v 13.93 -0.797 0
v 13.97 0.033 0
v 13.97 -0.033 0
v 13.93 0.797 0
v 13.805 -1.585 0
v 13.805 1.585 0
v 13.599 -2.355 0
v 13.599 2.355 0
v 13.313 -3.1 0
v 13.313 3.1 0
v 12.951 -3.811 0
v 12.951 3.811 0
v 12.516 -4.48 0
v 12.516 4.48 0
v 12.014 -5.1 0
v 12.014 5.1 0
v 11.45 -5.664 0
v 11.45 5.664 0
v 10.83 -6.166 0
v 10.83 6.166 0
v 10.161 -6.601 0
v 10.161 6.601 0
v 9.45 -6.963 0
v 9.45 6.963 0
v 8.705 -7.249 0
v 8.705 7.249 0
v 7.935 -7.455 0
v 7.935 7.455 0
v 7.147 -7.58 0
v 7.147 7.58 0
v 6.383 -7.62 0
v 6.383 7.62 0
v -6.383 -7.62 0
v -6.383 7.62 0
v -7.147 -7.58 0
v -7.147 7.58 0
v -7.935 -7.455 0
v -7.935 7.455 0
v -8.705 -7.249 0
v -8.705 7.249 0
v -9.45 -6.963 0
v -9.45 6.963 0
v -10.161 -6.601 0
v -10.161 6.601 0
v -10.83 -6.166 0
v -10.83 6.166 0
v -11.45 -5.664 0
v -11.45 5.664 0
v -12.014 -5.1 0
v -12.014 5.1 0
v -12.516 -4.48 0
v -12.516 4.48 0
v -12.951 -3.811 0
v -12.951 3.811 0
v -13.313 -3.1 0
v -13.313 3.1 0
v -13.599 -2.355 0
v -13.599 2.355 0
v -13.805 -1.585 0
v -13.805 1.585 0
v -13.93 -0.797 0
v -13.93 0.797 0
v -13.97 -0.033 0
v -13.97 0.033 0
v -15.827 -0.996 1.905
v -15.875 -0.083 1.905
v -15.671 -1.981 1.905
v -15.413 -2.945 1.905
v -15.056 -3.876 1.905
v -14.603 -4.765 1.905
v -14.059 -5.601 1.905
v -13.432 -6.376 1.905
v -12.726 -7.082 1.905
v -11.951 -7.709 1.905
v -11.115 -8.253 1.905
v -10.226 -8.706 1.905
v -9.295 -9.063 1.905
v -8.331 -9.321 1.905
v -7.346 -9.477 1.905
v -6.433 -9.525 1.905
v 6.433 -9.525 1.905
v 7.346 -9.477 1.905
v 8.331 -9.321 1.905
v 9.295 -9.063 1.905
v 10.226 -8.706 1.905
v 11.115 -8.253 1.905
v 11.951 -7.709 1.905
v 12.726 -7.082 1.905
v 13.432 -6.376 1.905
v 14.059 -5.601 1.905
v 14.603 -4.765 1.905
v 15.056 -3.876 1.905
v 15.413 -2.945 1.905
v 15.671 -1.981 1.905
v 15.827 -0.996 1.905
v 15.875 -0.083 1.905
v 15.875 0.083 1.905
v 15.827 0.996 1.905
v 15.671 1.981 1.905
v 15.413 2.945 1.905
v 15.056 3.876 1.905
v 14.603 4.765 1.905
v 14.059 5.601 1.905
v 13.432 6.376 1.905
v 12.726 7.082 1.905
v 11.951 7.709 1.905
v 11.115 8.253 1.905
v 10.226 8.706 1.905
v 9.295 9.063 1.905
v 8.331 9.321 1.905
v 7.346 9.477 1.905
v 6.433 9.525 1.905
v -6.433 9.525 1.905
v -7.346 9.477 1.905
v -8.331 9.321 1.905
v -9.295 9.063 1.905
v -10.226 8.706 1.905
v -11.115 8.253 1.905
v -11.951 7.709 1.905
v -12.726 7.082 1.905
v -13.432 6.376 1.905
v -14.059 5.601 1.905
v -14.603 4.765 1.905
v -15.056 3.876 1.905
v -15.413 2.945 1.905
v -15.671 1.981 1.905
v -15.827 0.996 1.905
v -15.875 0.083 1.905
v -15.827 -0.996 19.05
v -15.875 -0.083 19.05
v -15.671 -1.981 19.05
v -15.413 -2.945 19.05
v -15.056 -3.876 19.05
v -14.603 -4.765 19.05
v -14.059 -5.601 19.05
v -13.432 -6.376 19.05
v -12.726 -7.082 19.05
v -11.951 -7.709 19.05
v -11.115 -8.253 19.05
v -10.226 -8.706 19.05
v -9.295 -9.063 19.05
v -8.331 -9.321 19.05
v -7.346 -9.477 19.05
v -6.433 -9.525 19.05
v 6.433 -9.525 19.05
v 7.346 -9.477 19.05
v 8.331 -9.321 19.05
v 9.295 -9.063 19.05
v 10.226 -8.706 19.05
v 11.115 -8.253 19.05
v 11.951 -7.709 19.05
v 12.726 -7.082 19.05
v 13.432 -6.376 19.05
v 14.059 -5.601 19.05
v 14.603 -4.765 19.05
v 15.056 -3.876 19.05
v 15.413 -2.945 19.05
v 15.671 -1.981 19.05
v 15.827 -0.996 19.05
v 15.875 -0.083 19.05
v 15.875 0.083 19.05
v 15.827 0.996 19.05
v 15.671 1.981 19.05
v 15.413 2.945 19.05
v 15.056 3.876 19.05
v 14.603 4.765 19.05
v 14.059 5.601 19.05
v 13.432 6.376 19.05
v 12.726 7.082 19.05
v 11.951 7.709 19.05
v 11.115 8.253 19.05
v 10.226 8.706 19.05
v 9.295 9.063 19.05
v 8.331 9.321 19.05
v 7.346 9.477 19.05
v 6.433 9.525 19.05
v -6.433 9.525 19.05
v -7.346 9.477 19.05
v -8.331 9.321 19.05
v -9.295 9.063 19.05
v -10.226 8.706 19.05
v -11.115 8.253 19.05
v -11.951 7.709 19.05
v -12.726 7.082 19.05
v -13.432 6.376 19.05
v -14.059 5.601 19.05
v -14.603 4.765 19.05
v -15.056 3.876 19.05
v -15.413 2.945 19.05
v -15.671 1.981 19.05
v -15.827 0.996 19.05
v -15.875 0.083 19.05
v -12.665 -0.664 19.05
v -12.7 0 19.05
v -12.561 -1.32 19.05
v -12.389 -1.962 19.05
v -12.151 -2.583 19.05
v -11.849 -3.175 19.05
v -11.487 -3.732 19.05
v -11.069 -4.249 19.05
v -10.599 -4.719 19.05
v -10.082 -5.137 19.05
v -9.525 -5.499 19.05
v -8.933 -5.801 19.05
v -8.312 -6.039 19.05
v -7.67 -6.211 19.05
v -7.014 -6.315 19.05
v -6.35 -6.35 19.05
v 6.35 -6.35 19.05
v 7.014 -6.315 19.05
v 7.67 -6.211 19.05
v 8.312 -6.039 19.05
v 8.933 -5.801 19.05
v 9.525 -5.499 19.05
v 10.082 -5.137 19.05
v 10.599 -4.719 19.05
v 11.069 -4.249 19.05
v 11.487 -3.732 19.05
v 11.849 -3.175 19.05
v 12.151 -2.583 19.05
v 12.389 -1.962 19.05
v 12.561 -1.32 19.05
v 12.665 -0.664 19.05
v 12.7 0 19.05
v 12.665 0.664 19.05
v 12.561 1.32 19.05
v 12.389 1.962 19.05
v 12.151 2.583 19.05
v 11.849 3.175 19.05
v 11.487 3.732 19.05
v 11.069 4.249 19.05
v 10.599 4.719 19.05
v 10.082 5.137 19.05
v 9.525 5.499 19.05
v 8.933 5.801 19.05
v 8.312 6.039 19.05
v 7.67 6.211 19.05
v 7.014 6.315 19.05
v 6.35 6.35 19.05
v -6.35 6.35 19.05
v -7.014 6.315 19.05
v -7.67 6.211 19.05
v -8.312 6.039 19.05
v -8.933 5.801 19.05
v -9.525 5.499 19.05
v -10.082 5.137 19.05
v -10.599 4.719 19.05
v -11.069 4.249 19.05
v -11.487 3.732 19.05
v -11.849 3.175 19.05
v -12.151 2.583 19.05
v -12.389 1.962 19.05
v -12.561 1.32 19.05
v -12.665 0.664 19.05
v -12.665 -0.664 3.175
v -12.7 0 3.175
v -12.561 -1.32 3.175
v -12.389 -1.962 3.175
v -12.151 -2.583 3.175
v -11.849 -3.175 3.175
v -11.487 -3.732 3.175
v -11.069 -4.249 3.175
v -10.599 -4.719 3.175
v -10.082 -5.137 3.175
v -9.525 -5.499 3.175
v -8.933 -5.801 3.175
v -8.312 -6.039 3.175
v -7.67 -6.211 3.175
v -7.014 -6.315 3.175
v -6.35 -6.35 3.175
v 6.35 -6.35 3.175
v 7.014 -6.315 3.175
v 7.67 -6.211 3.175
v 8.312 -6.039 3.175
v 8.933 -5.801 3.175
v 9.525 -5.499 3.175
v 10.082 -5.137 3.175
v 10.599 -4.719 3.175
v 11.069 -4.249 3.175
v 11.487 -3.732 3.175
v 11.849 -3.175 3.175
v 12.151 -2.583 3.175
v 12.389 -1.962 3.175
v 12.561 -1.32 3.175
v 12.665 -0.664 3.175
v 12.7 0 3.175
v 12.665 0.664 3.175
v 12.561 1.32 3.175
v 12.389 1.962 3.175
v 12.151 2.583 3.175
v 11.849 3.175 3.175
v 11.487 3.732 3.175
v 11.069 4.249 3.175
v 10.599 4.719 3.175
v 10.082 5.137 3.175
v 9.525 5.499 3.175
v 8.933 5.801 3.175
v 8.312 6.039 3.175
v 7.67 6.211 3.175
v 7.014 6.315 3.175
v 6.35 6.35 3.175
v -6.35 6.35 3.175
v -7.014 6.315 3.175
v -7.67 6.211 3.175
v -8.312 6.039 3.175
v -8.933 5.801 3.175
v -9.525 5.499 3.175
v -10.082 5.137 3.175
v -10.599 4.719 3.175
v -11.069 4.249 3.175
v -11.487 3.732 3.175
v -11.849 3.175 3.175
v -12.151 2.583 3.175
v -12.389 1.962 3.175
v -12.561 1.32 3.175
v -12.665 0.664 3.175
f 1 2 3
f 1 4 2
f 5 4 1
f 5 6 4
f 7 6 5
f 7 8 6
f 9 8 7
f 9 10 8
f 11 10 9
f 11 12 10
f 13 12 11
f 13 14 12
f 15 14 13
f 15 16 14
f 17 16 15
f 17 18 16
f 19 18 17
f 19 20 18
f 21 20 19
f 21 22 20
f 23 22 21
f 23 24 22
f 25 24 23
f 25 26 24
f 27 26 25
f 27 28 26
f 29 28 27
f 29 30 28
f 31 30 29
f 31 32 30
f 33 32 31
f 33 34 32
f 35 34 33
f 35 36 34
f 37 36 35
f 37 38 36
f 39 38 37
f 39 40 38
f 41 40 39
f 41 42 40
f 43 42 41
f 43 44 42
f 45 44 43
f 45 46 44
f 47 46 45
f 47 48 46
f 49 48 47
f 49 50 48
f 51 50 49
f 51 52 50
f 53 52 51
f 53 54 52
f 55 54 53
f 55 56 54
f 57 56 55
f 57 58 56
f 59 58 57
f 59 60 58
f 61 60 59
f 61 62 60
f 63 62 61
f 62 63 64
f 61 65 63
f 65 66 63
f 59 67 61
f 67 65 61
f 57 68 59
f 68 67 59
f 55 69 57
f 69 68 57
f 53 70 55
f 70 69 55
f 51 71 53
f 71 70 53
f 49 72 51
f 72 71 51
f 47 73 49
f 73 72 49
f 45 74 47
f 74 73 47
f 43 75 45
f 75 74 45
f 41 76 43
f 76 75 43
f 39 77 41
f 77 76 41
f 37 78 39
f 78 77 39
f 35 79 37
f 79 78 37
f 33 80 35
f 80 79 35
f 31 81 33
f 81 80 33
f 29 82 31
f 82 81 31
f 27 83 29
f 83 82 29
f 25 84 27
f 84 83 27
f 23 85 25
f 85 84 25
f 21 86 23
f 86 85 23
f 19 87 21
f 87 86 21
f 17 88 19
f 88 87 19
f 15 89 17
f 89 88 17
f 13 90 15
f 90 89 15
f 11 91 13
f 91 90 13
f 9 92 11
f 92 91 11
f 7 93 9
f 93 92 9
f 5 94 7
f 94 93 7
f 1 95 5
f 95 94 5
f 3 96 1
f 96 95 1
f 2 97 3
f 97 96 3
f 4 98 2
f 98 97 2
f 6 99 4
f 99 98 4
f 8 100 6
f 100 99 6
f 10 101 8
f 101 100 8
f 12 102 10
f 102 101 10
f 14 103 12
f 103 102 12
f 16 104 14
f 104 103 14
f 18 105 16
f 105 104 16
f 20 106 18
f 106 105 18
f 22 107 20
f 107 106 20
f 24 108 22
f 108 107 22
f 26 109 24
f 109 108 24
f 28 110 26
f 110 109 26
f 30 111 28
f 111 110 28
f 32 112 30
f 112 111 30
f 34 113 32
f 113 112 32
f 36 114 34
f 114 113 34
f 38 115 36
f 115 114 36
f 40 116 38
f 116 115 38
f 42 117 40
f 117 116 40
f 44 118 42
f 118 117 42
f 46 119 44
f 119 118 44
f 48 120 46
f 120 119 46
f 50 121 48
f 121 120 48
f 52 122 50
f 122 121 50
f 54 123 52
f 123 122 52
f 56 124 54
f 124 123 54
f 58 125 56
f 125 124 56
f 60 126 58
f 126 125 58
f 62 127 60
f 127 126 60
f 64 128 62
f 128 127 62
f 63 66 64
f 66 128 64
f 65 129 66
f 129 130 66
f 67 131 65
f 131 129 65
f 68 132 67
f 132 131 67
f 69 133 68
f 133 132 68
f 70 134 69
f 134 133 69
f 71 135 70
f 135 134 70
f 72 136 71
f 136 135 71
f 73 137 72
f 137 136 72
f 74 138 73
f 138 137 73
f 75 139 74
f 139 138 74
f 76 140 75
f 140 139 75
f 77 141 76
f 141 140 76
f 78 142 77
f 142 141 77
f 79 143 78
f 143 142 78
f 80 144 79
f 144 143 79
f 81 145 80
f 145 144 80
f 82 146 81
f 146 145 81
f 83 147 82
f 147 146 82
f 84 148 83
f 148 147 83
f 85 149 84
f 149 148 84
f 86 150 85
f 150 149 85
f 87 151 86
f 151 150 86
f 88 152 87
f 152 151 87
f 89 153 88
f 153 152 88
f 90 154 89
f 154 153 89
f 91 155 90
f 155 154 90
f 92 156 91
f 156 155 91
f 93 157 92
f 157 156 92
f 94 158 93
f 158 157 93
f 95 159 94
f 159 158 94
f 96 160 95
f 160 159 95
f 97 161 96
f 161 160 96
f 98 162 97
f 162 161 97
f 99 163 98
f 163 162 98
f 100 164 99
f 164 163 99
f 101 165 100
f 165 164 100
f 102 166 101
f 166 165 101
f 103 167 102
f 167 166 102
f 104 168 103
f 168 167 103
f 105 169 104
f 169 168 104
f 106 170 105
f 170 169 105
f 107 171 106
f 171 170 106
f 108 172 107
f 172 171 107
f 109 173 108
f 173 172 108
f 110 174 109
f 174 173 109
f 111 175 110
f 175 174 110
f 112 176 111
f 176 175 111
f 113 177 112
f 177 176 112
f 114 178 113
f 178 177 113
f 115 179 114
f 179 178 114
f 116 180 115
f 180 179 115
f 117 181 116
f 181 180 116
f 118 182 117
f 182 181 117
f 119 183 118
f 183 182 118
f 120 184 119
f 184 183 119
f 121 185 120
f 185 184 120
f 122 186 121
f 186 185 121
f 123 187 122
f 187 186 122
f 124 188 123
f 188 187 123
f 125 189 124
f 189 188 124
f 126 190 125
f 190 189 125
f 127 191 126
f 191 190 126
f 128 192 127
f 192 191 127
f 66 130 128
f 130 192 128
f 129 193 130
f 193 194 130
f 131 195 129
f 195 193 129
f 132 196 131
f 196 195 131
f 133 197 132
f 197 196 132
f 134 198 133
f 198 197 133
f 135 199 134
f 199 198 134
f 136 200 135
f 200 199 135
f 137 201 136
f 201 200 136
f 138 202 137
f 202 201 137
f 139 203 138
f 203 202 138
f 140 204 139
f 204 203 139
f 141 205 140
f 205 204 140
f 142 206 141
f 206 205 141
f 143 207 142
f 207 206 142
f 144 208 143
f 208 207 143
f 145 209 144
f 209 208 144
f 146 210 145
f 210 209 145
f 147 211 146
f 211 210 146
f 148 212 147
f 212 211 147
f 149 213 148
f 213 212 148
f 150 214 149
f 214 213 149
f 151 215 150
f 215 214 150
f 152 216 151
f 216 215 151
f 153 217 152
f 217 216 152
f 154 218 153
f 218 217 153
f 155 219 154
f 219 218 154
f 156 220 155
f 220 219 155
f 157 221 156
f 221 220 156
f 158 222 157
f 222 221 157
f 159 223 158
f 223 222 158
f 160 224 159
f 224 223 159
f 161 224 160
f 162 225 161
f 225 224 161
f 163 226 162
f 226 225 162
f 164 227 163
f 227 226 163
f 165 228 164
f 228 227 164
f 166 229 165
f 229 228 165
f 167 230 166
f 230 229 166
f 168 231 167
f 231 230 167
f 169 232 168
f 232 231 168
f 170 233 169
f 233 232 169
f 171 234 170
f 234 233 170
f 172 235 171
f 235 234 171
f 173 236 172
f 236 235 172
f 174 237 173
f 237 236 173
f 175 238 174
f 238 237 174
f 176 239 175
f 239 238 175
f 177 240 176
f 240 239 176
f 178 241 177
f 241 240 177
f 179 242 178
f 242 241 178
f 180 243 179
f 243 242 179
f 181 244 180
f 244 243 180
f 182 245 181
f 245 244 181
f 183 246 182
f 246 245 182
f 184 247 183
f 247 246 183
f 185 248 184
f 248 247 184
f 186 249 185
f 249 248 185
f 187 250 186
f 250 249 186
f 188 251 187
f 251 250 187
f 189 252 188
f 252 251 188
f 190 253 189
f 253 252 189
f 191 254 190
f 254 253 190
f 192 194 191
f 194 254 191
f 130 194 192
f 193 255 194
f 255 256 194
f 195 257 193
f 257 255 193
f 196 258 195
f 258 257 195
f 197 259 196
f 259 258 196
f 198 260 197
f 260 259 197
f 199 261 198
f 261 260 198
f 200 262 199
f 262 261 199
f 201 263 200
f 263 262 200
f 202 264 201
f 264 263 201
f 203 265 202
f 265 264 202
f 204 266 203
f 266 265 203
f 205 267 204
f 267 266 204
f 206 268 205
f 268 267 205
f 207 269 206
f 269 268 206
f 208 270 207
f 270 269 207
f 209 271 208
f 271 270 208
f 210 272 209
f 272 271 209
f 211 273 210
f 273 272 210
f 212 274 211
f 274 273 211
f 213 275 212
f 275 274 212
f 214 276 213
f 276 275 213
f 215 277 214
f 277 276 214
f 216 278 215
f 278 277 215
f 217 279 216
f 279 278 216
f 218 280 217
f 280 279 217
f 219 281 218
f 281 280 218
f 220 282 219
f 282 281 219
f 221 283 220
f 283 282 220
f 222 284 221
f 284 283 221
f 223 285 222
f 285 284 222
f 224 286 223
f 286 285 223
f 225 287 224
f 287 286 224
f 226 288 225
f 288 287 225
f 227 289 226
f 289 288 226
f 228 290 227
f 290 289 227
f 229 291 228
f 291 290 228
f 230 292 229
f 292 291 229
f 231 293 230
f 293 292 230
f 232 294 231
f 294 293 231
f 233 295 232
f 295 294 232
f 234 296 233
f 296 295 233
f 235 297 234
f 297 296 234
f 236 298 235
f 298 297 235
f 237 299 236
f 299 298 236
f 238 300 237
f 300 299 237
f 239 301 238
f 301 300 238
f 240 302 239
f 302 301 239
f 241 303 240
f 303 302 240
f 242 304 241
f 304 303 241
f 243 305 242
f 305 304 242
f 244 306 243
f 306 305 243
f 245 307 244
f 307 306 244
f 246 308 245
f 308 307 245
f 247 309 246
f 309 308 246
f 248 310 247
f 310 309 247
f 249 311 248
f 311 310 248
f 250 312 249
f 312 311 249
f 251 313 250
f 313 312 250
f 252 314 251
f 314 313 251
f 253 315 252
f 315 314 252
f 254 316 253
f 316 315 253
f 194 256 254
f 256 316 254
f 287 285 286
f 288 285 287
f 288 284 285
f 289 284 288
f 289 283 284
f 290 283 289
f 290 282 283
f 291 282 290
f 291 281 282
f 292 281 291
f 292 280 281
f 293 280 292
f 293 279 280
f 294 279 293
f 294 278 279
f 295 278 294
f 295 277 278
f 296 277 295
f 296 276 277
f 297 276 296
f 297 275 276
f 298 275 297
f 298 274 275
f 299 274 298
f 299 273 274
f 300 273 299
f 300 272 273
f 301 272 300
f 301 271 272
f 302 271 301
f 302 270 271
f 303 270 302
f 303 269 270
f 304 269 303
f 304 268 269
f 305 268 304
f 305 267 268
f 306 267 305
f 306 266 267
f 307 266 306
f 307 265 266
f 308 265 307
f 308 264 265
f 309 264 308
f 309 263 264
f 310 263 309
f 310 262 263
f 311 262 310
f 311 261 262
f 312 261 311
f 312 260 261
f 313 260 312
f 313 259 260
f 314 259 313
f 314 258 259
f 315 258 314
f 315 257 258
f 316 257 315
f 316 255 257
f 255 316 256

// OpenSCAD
// file: ../lib/TOGMod1Constructors.scad
// TOGMod1Constructors-v1.11
// 
// Functions to construct objects understood by TOGMod1
// 
// v1.1:
// - Add togmod1_make_rounded_rect
// v1.2:
// - togmod1_make_rounded_rect can make ovals
// v1.3:
// - togmod1_circle_points, to just get the points of a circle
// - if pos parameter to circle function has a third element,
//   returned vertexes will include it as the z component;
// v1.3.1
// - Some assertions
// v1.4:
// - Refactor togmod1_rounded_rect_points and togmod1_circle_points
//   to use togmod1__make_nd_vector_adder for adapting to whatever
//   `pos` parameter is.
// v1.5:
// - togmod_rounded_rect_points will not simplify completely rounded sides
//   (where length of side is exactly twice the rounding radius)
//   unless simplify_rounded_sides=true
//   - This makes it more useful for polyhedron generation,
//     where radius varies, but number of points must remain constant.
// v1.6:
// - togmod1_make_rect makes a simple rectangle
// - togmod1_make_rounded_rect will defer to togmod1_make_rect when r=0
// v1.7:
// - togmod1_make_circle will return empty shape (["union"]) when d=0
// v1.8:
// - Add togmod1_text
// v1.9:
// - togmod1_circle_points uses 3 as minimum circle point count instead of 6
// v1.10:
// - Fix togmod1_linear_extrude_y so that range corresponds to Y start/end and
//   polygon X,Y correspond to X,Z.  Previously it was rotated wrongly,
//   which would have gone unnoticed for symmetrical shapes centered at 0,0.
// v1.11:
// - Remove an 'echo'

use <./TOGArrayLib1.scad>

function togmod1__make_nd_vector_adder(origin=[0,0]) =
	let(origin_is_zero = tal1_reduce(true, origin, function(prev,item) prev && item == 0))
	origin_is_zero ? (function(vec) len(vec) >= len(origin) ? vec : tal1_replace_at(origin, 0, vec)) :
	function(vec) [
		for(i=[0:1:max(len(origin),len(vec))-1]) (len(vec) > i ? vec[i] : 0) + (len(origin) > i ? origin[i] : 0),
	];

assert([1,2,3] == togmod1__make_nd_vector_adder()([1,2,3]));
assert([1,2,3] == togmod1__make_nd_vector_adder([0,0,3])([1,2]));


function togmod1_make_cuboid(size) =
	assert(is_list(size))
	assert(len(size) >= 3)
	assert(is_num(size[0]))
	assert(is_num(size[1]))
	assert(is_num(size[2]))
	["polyhedron-vf", [
		[-size[0]/2, -size[1]/2, -size[2]/2],
		[+size[0]/2, -size[1]/2, -size[2]/2],
		[-size[0]/2, +size[1]/2, -size[2]/2],
		[+size[0]/2, +size[1]/2, -size[2]/2],
		[-size[0]/2, -size[1]/2, +size[2]/2],
		[+size[0]/2, -size[1]/2, +size[2]/2],
		[-size[0]/2, +size[1]/2, +size[2]/2],
		[+size[0]/2, +size[1]/2, +size[2]/2]
	], [
		[0,1,3,2],[0,4,5,1],[4,6,7,5],[3,7,6,2],[1,5,7,3],[6,4,0,2]
	]];

function togmod1_make_polygon(verts) =
	["polygon-vp", verts, [[for( i=[0:1:len(verts)-1] ) i%len(verts)]]];

function togmod1_rounded_rect_points(size, r, pos=[0,0], simplify_rounded_sides=false) =
	assert(is_list(size))
	assert(len(size) >= 2)
	let(radii = is_list(r) ? r : is_num(r) ? [r,r] : assert(false, "rounded_rect r(adius) should be list<num> or num"))
	let(rx = radii[0])
	let(ry = radii[1])
	assert(is_num(rx))
	assert(is_num(ry))
	assert(size[0] >= 2*rx, str("size[0] must be >= 2*r[0]; size[0] = ",size[0],", 2*r[0] = ",2*rx))
	assert(size[1] >= 2*ry, str("size[1] must be >= 2*r[1]; size[1] = ",size[1],", 2*r[1] = ",2*ry))
	let(quarterfn=max($fn/4, 1))
	let(qfnx = simplify_rounded_sides && size[0] == 2*rx ? quarterfn-1 : quarterfn)
	let(qfny = simplify_rounded_sides && size[1] == 2*ry ? quarterfn-1 : quarterfn)
	let(finalizepos = togmod1__make_nd_vector_adder(pos))
[
	for(a=[0 : 1 : qfnx]) let(ang=      a*90/quarterfn) finalizepos([ size[0]/2-rx + rx*cos(ang),  size[1]/2-ry + ry*sin(ang)]),
	for(a=[0 : 1 : qfny]) let(ang= 90 + a*90/quarterfn) finalizepos([-size[0]/2+rx + rx*cos(ang),  size[1]/2-ry + ry*sin(ang)]),
	for(a=[0 : 1 : qfnx]) let(ang=180 + a*90/quarterfn) finalizepos([-size[0]/2+rx + rx*cos(ang), -size[1]/2+ry + ry*sin(ang)]),
	for(a=[0 : 1 : qfny]) let(ang=270 + a*90/quarterfn) finalizepos([ size[0]/2-rx + rx*cos(ang), -size[1]/2+ry + ry*sin(ang)]),
];

function togmod1_make_rect(size) =
	togmod1_make_polygon([
		[-size[0]/2, -size[1]/2],
		[+size[0]/2, -size[1]/2],
		[+size[0]/2, +size[1]/2],
		[-size[0]/2, +size[1]/2],
	]);

function togmod1_make_rounded_rect(size, r) =
	r == 0 ? togmod1_make_rect(size) :
	togmod1_make_polygon(togmod1_rounded_rect_points(size,r,simplify_rounded_sides=true));

/**
 * Returns points for an approximation of a circle where points are at distance r from pos.
 * Can be used to make other regular polygons, but the faces will be less than that
 * distance from pos (do some trig if you want face distance, e.g. for a hex nut).
 */
function togmod1_circle_points(r, pos=[0,0], d=undef) =
	assert( !is_undef(r) || !is_undef(d) )
	assert(!is_undef(pos[0]))
	assert(!is_undef(pos[1]))
	let(finalizepos = togmod1__make_nd_vector_adder(pos))
	let(r_ = !is_undef(r) ? r : d/2)
	let(fn = max($fn, 3))
	[for(i=[0 : 1 : fn-1]) finalizepos([r_*cos(i*360/fn), r_*sin(i*360/fn)])];

function togmod1_make_circle(r, pos=[0,0], d=undef) =
	r == 0 || d == 0 ? ["union"] :
	togmod1_make_polygon(togmod1_circle_points(r=r, pos=pos, d=d));

function togmod1_make_cylinder(d, zrange=[0,1], r=undef, pos=[0,0]) =
	assert( !is_undef(r) || !is_undef(d) )
	let( r_ = !is_undef(r) ? r : d/2 )
	// TODO: Make polyhedron directly
	["linear-extrude-zs", zrange, togmod1_make_circle(r=r_, pos=pos)];

function togmod1__is_range1d(range) = is_list(range) && len(range) == 2 && is_num(range[0]) && is_num(range[1]);

function togmod1_linear_extrude_z(range, shape) =
	assert(togmod1__is_range1d(range))
	["linear-extrude-zs", range, shape];
function togmod1_linear_extrude_x(range, shape) =
	assert(togmod1__is_range1d(range))
	["rotate", [90, 0, 90], togmod1_linear_extrude_z(range, shape)];
function togmod1_linear_extrude_y(range, shape) =
	assert(togmod1__is_range1d(range))
	["rotate", [90, 0,  0], togmod1_linear_extrude_z([-range[1], -range[0]], shape)];

function togmod1_text(text, size, font, halign, valign, spacing, direction, language, script) =
	["text-tsfhvsdls", text, size, font, halign, valign, spacing, direction, language, script];
// file: ../lib/TOGArrayLib1.scad
// TOGArrayLib1.5
// 
// Functions for working with arrays.
// 
// v1.1:
// - tal1_reduce assert(is_list(items)) to prevent infinite recursion
//   when given undefined or other non-list values
// v1.1.1:
// - Fix tal1_uniq_remap_v2 to return "list-remap-result" as the
//   first element of the returned list
// v1.2:
// - Add tal1_replace_at function
// v1.3:
// - tal1_is_vec_of, tal1_is_vec_of_num
// v1.4:
// - tal1_assert_for_each, for when you want to assert something
//   about each of a list of items and get nice failure messages
// v1.5:
// - Add tal1_duplicate_reversed function, which may be
//   handy when generating symmetrical polygons and stuff.

/**
 * Make a list with the contents of list `a`,
 * but starting at offset `off`, replaced by the contents of list `b`.
 * len(result) = max(len(a), off+len(b))
 */
function tal1_replace_at(a, off, b, default_value=undef, default_value_function=undef) =
	assert(is_list(a))
	assert(is_list(b))
	let( _dvf = !is_undef(default_value_function) ? default_value_function : function(i) default_value )
[
	for( i=[0:1:min(off,len(a))-1] ) a[i],
	for( i=[len(a):1:off-1] ) _dvf(i),
	for( i=[off:1:off+len(b)-1] ) b[i-off],
	for( i=[off+len(b):1:len(a)-1] ) a[i],
];

// Simplest case
assert([] == tal1_replace_at([], 0, []));
// Second simplest cases
assert(["foo"] == tal1_replace_at(["foo"], 0, []));
assert(["foo"] == tal1_replace_at([], 0, ["foo"]));
// Replace one item
assert(["foo","quux","baz"] == tal1_replace_at(["foo","bar","baz"], 1, ["quux"]));
// Replace and extend
assert(["foo","quux","tuna","tina"] == tal1_replace_at(["foo","bar","baz"], 1, ["quux", "tuna", "tina"]));
// Add beyond end of `a`
assert(["foo","zzz","quux"] == tal1_replace_at(["foo"], 2, ["quux"], default_value="zzz"));
// Adding 'nothing' should still fill to that point with defaults
assert(["foo","zzz","zzz"] == tal1_replace_at(["foo"], 3, [], default_value="zzz"));


function tal1_reduce(start, items, func, offset=0) =
	assert(is_list(items))
	len(items) == offset ? start :
	tal1_reduce(func(start, items[offset]), items, func, offset+1);

function tal1_consecutive_duplicate_count(items) = tal1_reduce(
	[0, undef],
	items,
	function(z,item) [z[0] + (item == z[1] ? 1 : 0), item]
)[0];

assert(0 == tal1_consecutive_duplicate_count([]));
assert(0 == tal1_consecutive_duplicate_count([50]));
assert(1 == tal1_consecutive_duplicate_count([50,50]));
assert(0 == tal1_consecutive_duplicate_count([50,51,52,53]));
assert(1 == tal1_consecutive_duplicate_count([50,51,52,52]));
assert(3 == tal1_consecutive_duplicate_count([50,50,50,50]));

// Set test_size to arbirarily large values
// to ensure that OpenSCAD can handle heavy recursion
let(test_size=1000) assert(test_size/2 == tal1_consecutive_duplicate_count([for(i=[0:1:test_size-1]) floor(i/2)]));



function tal1_uniq_(items, off0, off1) =
	let(chunklen = off1-off0)
	chunklen == 0 ? [] :
	chunklen == 1 ? [items[off0]] :
	let(half=floor(chunklen/2))
	let(left  = tal1_uniq_(items, off0     , off0+half))
	let(right = tal1_uniq_(items, off0+half, off1     ))
	assert(len(left) > 0)
	assert(len(right) > 0)
	left[len(left)-1] == right[0] ? [each left, for(i=[1:1:len(right)-1]) right[i]] :
	[each left, each right];

/** Given a list of items, returns a new list with identical consecutive items merged */
function tal1_uniq(items) = tal1_uniq_(items, 0, len(items));

assert([] == tal1_uniq([]));
assert([123] == tal1_uniq([123]));
assert([55,0,1,2,3] == tal1_uniq([55,0,1,2,3]));
assert([55,0,1,2] == tal1_uniq([55,0,1,1,2]));
assert([55,0,1] == tal1_uniq([55,55,0,0,0,0,0,0,1,1,1,1]));
assert([55,0] == tal1_uniq([55,0,0,0,0,0,0,0]));



/**
 * Returns [new items, old index -> new index mapping].
 * No-op version.
 */
function tal1_uniq_remap_v1(items) =
	["list-remap-result", items, [for (vi=[0:1:len(items)-1]) vi]];

// [a, a, b, b, c, c]
//
// [a,    ...], []  -> [a],[0]
// [a, a, ...], [0] -> [a],[0,0]

assert([1,2,3] == [1,2,3]);

/**
 * Recursive version that will combine adjacent identical vertexes,
 * but will use the original items.
 */
function tal1_uniq_remap_v2(items, map=[]) =
	let(index = len(map))
	len(items) == index ? ["list-remap-result", items, map] :
	index == 0 ? tal1_uniq_remap_v2(items, [0]) :
	items[index] == items[map[index-1]] ? tal1_uniq_remap_v2(items, [for(vi=map) vi, map[index-1]]) :
	tal1_uniq_remap_v2(items, [for(vi=map) vi, index]);

assert(tal1_uniq_remap_v2([1,1,2,2,3,4]) == ["list-remap-result", [1,1,2,2,3,4], [0,0,2,2,4,5]]);


/**
 * Returns true if `vec` is a list of at least min_len items
 * and component_check(each item, even those beyond min_len) is true.
 */
function tal1_is_vec_of(vec, min_len=0, component_check=function(x) true) =
	assert(is_num(min_len) && min_len >= 0)
	assert(is_function(component_check))
	is_list(vec) && len(vec) >= min_len &&
	tal1_reduce(true, vec, function(prev,item) prev && component_check(item));

function tal1_is_vec_of_num(vec, min_len=0) = tal1_is_vec_of(vec, min_len, function(i) is_num(i));

assert( true == tal1_is_vec_of_num([1,2,3]));
assert( true == tal1_is_vec_of_num([]));
assert( true == tal1_is_vec_of_num([1,2,3], 3));
assert(false == tal1_is_vec_of_num([1,2], 3));
assert(false == tal1_is_vec_of_num([1,2,"spoon"], 3));
// Requirements are ambiguous when
// first min_len items are numbers, but there are non-numeric items afterwards,
// so let's error on the side of saying 'no, it's not a list of numbers';
// i.e. the item check and the min_len are independent.
assert(false == tal1_is_vec_of_num([1,2,3,"artichoke"], 3));


/**
 * Asserts that item_checker(each item in list, index of item)[0] is true.
 * Second element of item_checker return value is assertion message.
 * Returns the original list, in case that's useful to you.
 */
function tal1_assert_for_each(list, item_checker) =
	let( _ignored = [ for(i=[0:1:len(list)-1])
		let(q=item_checker(list[i],i))
		let(passed=is_bool(q) ? q : is_list(q) ? q[0] : assert(false, str(
			"tal1_assert_for_each: item_checker should return Bool|[Bool,String], but returned ",
			q, " for item at index ", i)))
		let(message=is_list(q) ? q[1] : undef)
		assert(passed, message)
		q
	])
	list;

// Callback can return a boolean...
assert([1,2,3] == tal1_assert_for_each([1,2,3], function(v,i) is_num(v)));
// ...or a [boolean, string]
assert([1,2,3] == tal1_assert_for_each([1,2,3], function(v,i) [is_num(v), "element be a num"]));

// [a, b, c] -> [a, b, c, rxf(c), rxf(b), rxf(a)]
function tal1_duplicate_reversed(list, rxf=function(item) item) =
	[
		each list,
		for( i=[len(list)-1 : -1 : 0] ) rxf(list[i]),
	];
// file: ../lib/TOGComplexLib1.scad
function tcplx1_multiply(a, b) =
	[a[0]*b[0] - a[1]*b[1], a[0]*b[1] + a[1]*b[0]];
function tcplx1_divide(a, b) =
	let(bot = (b[0]*b[0] + b[1]*b[1]))
	[
		(a[0]*b[0] + a[1]*b[1])/bot,
		(a[1]*b[0] - a[0]*b[1])/bot
	];

assert([-11,23] == tcplx1_multiply([3,2], [1,7]));

assert([-1,3] == tcplx1_multiply([3,1], [0,1]));
assert([-1,3] == tcplx1_multiply([0,1], [3,1]));

echo(tcplx1_divide([-1,3], [3,1]));
assert([0,1] == tcplx1_divide([-1,3], [3,1]));

function tcplx1_normalize(vec) =
	let(veclen = sqrt(vec[0]*vec[0]+vec[1]*vec[1]))
	[vec[0] / veclen, vec[1] / veclen];

function tcplx1_relative_turnvec_vv(v0, v1) =
	tcplx1_divide(tcplx1_normalize(v1), tcplx1_normalize(v0));

function tcplx1_relative_turnvec_abc(p0, p1, p2) = tcplx1_relative_turnvec_vv(p1-p0, p2-p1);

// A 90-degree turn
assert([0,1] == tcplx1_relative_turnvec_abc([0,0], [1,0], [1,1]));
assert([0,1] == tcplx1_relative_turnvec_abc([0,0], [0,1], [-1,1]));

// A 45-degree turn
assert(tcplx1_normalize([1,1]) == tcplx1_relative_turnvec_abc([0,0], [1,0], [ 2,1]));
assert(tcplx1_normalize([1,1]) == tcplx1_relative_turnvec_abc([0,0], [0,1], [-1,2]));


function tcplx1_relative_angle_abc(p0, p1, p2) =
	let(turnvec = tcplx1_relative_turnvec_abc(p0, p1, p2))
	atan2(turnvec[1], turnvec[0]);

assert(-135 == tcplx1_relative_angle_abc([0,0], [1,0], [0,-1]));
assert( -90 == tcplx1_relative_angle_abc([0,0], [1,0], [1,-1]));
assert(   0 == tcplx1_relative_angle_abc([0,0], [1,0], [2, 0]));
assert(  90 == tcplx1_relative_angle_abc([0,0], [1,0], [1, 1]));
assert( 135 == tcplx1_relative_angle_abc([0,0], [1,0], [0, 1]));

assert(  90 == tcplx1_relative_angle_abc([1,1], [3,3], [1, 5]));
// file: ../lib/TOGVecLib0.scad
// Note: TOGMod1Constructors's togmod1__make_nd_vector_adder is used for similar purpose.

function togvec0_extend(vec, length, filler=0) = [
	for( i=[0 : 1 : length-1] ) len(vec) <= i ? filler : vec[i]
];

function togvec0_add_vec(a, b) =
	let( newlen = max(len(a), len(b)) )
	togvec0_extend(a, newlen) + togvec0_extend(b, newlen);

function togvec0_offset_points(points, offset, numtovec=function(n) [0,0,n] ) =
	let( offset_vec =
		is_list(offset) ? offset :
		is_num(offset) ? numtovec(offset) :
		assert(false, str("togvec0_offset_points: `offset` must be a List<Number> or Number; got: ", offset)) )
	[for(p=points) togvec0_add_vec(p, offset_vec)];
// file: ../lib/TOGMod1.scad
// TOGMod1.9
// OpenSCAD library for representing shapes
// 
// See also: Functional OpenSCAD (https://github.com/thehans/FunctionalOpenSCAD)
// 
// v1.8:
// - Add `text-tsfhvsdls`
// v1.9
// - Add `offset-ds` (offset with _d_elta a _s_hape)

module togmod1_domodule(mod) {
	assert(is_list(mod));
	assert(len(mod) > 0);
	if( mod[0] == "polygon-vp" ) {
		// ["polygon-vp", vertexes, paths]
		polygon(points=mod[1], paths=mod[2]);
	} else if( mod[0] == "polyhedron-vf" ) {
		polyhedron(mod[1], faces=mod[2]);
	} else if( mod[0] == "scale" ) {
		assert(len(mod) == 3);
		scale(mod[1]) togmod1_domodule(mod[2]);
	} else if( mod[0] == "translate" ) {
		assert(len(mod) == 3);
		assert(is_list(mod[1]));
		for(c=mod[1]) assert(is_num(c), "translate component should be numeric");
		translate(mod[1]) togmod1_domodule(mod[2]);
	} else if( mod[0] == "rotate" ) {
		assert(len(mod) == 3);
		rotate(mod[1]) togmod1_domodule(mod[2]);
	} else if( mod[0] == "intersection" ) {
		intersection_for( i=[1:1:len(mod)-1] ) togmod1_domodule(mod[i]);
	} else if( mod[0] == "difference" ) {
		difference() {
			togmod1_domodule(mod[1]);
			for( i=[2:1:len(mod)-1] ) togmod1_domodule(mod[i]);
		}
	} else if( mod[0] == "union" ) {
		for( i=[1:1:len(mod)-1] ) togmod1_domodule(mod[i]);
	} else if( mod[0] == "hull" ) {
		hull() for( i=[1:1:len(mod)-1] ) togmod1_domodule(mod[i]);
	} else if( mod[0] == "offset-rs" ) {
		assert(len(mod) == 3);
		assert(is_num(mod[1]));
		assert(is_list(mod[2]));
		offset(mod[1]) togmod1_domodule(mod[2]);
	} else if( mod[0] == "linear-extrude-zs" ) {
		// ["linear-extrude-zs", [z0,z1], 2d_shape] // centered
		// ["linear-extrude-zs", height, 2d_shape]
		let( zrange = is_list(mod[1]) ? mod[1] : [-mod[1]/2, mod[1]/2] ) {
			translate([0,0,zrange[0]]) linear_extrude(zrange[1]-zrange[0]) togmod1_domodule(mod[2]);
		}
	} else if( mod[0] == "render" ) {
		render() togmod1_domodule(mod[1]);
	} else if( mod[0] == "minkowski" ) {
		minkowski() {
			togmod1_domodule(mod[1]);
			togmod1_domodule(mod[2]);
		}
	} else if( mod[0] == "x-debug" ) {
		# togmod1_domodule(mod[1]);
	} else if( mod[0] == "x-color" ) {
		color(mod[1]) togmod1_domodule(mod[2]);
	} else if( mod[0] == "text-tsfhvsdls" ) {
		text(text=mod[1], size=mod[2], font=mod[3], halign=mod[4], valign=mod[5], spacing=mod[6], direction=mod[7], language=mod[7], script=mod[8]);
	} else if( mod[0] == "offset-ds" ) {
		assert(is_num(mod[1]));
		assert(is_list(mod[2]));
		offset(delta=mod[1]) togmod1_domodule(mod[2]);
	} else {
		assert(false, str("Unrecognized shape: ", mod[0]));
	}
}
// file: ../lib/SimpleCap0.scad
// SimpleCap0.4
// 
// Library for making very simple caps for things
// whose outline can be described by a rath.
// 
// Versions:
// v0.2:
// - Bevel the bottom somewhat
// v0.3:
// - Allow bevel_size to be overridden.
//   Useful in cases where the default makes an invalid shape.
// v0.4
// - Support floor_thickness=0 meaning 'hollow tube'

use <../lib/TOGPath1.scad>
use <../lib/TOGPolyhedronLib1.scad>
use <../lib/TOGVecLib0.scad>

function simplecap0_decode_rath(shape) =
	assert(is_list(shape) && len(shape) >= 1, str("Shape must be a list of length at least 1, got: ", shape))
	shape[0] == "togpath1-rath" ? shape :
	shape[0] == "circle-d" ? togpath1_make_circle_rath(r=shape[1]/2) :
	shape[0] == "circle-r" ? togpath1_make_circle_rath(r=shape[1]) :
	shape[0] == "oval-wh" ? let(size=shape[1]) togpath1_make_rectangle_rath([size[0],size[1]], [["round", min(size[0],size[1])/2]]) :
	assert(false, str("Unrecognized shape description: ", shape));

function simplecap0_make_cap(inner_shape, total_height=19.05, floor_thickness=3.175, wall_thickness=1.6, bevel_size=undef) =
	let( rath = simplecap0_decode_rath(inner_shape) )
	let( eff_bevel_size = !is_undef(bevel_size) ? bevel_size :
		// Could be clever here based on wall_thickness and the rath.
		// For now, default to effectively floor_thicknesS*0.6, since that matches existing behavior.
		max(0.1, floor_thickness*0.6)
	)
	let( t0 = 0, t1 = wall_thickness )
	let( y0 = 0, yt = total_height, yf = floor_thickness )
	let( bb = eff_bevel_size )
	let( closed = yf > 0 )
	tphl1_make_polyhedron_from_layer_function([
		[y0   , t1-bb],
		[y0+abs(bb), t1   ],
		[yt   , t1   ],
		[yt   , t0   ],
		[yf   , t0   ],
		if( !closed ) [yf, t1-bb],
	], function(zo) let(z = zo[0], wall_offset=zo[1])
	   togpath1_rath_to_polypoints(togpath1_offset_rath(rath, wall_offset)),
		layer_points_transform = "key0-to-z",
		cap_top    = closed,
		cap_bottom = closed
	);
// main file
// CigarettHolder1Cap, v1.2
//
// v1.2
// - Updated version number to reflect that there is
//   now a beveled bottom edge since SimpleCap0.2

module __cigaretteholder1cap__end_params() { }

use <../lib/SimpleCap0.scad>
use <../lib/TOGMod1.scad>

inch = 25.4;
$fn = 64;

togmod1_domodule(simplecap0_make_cap(["oval-wh", [1*inch, 1/2*inch]], 3/4*inch, 3.175, 3.175));
